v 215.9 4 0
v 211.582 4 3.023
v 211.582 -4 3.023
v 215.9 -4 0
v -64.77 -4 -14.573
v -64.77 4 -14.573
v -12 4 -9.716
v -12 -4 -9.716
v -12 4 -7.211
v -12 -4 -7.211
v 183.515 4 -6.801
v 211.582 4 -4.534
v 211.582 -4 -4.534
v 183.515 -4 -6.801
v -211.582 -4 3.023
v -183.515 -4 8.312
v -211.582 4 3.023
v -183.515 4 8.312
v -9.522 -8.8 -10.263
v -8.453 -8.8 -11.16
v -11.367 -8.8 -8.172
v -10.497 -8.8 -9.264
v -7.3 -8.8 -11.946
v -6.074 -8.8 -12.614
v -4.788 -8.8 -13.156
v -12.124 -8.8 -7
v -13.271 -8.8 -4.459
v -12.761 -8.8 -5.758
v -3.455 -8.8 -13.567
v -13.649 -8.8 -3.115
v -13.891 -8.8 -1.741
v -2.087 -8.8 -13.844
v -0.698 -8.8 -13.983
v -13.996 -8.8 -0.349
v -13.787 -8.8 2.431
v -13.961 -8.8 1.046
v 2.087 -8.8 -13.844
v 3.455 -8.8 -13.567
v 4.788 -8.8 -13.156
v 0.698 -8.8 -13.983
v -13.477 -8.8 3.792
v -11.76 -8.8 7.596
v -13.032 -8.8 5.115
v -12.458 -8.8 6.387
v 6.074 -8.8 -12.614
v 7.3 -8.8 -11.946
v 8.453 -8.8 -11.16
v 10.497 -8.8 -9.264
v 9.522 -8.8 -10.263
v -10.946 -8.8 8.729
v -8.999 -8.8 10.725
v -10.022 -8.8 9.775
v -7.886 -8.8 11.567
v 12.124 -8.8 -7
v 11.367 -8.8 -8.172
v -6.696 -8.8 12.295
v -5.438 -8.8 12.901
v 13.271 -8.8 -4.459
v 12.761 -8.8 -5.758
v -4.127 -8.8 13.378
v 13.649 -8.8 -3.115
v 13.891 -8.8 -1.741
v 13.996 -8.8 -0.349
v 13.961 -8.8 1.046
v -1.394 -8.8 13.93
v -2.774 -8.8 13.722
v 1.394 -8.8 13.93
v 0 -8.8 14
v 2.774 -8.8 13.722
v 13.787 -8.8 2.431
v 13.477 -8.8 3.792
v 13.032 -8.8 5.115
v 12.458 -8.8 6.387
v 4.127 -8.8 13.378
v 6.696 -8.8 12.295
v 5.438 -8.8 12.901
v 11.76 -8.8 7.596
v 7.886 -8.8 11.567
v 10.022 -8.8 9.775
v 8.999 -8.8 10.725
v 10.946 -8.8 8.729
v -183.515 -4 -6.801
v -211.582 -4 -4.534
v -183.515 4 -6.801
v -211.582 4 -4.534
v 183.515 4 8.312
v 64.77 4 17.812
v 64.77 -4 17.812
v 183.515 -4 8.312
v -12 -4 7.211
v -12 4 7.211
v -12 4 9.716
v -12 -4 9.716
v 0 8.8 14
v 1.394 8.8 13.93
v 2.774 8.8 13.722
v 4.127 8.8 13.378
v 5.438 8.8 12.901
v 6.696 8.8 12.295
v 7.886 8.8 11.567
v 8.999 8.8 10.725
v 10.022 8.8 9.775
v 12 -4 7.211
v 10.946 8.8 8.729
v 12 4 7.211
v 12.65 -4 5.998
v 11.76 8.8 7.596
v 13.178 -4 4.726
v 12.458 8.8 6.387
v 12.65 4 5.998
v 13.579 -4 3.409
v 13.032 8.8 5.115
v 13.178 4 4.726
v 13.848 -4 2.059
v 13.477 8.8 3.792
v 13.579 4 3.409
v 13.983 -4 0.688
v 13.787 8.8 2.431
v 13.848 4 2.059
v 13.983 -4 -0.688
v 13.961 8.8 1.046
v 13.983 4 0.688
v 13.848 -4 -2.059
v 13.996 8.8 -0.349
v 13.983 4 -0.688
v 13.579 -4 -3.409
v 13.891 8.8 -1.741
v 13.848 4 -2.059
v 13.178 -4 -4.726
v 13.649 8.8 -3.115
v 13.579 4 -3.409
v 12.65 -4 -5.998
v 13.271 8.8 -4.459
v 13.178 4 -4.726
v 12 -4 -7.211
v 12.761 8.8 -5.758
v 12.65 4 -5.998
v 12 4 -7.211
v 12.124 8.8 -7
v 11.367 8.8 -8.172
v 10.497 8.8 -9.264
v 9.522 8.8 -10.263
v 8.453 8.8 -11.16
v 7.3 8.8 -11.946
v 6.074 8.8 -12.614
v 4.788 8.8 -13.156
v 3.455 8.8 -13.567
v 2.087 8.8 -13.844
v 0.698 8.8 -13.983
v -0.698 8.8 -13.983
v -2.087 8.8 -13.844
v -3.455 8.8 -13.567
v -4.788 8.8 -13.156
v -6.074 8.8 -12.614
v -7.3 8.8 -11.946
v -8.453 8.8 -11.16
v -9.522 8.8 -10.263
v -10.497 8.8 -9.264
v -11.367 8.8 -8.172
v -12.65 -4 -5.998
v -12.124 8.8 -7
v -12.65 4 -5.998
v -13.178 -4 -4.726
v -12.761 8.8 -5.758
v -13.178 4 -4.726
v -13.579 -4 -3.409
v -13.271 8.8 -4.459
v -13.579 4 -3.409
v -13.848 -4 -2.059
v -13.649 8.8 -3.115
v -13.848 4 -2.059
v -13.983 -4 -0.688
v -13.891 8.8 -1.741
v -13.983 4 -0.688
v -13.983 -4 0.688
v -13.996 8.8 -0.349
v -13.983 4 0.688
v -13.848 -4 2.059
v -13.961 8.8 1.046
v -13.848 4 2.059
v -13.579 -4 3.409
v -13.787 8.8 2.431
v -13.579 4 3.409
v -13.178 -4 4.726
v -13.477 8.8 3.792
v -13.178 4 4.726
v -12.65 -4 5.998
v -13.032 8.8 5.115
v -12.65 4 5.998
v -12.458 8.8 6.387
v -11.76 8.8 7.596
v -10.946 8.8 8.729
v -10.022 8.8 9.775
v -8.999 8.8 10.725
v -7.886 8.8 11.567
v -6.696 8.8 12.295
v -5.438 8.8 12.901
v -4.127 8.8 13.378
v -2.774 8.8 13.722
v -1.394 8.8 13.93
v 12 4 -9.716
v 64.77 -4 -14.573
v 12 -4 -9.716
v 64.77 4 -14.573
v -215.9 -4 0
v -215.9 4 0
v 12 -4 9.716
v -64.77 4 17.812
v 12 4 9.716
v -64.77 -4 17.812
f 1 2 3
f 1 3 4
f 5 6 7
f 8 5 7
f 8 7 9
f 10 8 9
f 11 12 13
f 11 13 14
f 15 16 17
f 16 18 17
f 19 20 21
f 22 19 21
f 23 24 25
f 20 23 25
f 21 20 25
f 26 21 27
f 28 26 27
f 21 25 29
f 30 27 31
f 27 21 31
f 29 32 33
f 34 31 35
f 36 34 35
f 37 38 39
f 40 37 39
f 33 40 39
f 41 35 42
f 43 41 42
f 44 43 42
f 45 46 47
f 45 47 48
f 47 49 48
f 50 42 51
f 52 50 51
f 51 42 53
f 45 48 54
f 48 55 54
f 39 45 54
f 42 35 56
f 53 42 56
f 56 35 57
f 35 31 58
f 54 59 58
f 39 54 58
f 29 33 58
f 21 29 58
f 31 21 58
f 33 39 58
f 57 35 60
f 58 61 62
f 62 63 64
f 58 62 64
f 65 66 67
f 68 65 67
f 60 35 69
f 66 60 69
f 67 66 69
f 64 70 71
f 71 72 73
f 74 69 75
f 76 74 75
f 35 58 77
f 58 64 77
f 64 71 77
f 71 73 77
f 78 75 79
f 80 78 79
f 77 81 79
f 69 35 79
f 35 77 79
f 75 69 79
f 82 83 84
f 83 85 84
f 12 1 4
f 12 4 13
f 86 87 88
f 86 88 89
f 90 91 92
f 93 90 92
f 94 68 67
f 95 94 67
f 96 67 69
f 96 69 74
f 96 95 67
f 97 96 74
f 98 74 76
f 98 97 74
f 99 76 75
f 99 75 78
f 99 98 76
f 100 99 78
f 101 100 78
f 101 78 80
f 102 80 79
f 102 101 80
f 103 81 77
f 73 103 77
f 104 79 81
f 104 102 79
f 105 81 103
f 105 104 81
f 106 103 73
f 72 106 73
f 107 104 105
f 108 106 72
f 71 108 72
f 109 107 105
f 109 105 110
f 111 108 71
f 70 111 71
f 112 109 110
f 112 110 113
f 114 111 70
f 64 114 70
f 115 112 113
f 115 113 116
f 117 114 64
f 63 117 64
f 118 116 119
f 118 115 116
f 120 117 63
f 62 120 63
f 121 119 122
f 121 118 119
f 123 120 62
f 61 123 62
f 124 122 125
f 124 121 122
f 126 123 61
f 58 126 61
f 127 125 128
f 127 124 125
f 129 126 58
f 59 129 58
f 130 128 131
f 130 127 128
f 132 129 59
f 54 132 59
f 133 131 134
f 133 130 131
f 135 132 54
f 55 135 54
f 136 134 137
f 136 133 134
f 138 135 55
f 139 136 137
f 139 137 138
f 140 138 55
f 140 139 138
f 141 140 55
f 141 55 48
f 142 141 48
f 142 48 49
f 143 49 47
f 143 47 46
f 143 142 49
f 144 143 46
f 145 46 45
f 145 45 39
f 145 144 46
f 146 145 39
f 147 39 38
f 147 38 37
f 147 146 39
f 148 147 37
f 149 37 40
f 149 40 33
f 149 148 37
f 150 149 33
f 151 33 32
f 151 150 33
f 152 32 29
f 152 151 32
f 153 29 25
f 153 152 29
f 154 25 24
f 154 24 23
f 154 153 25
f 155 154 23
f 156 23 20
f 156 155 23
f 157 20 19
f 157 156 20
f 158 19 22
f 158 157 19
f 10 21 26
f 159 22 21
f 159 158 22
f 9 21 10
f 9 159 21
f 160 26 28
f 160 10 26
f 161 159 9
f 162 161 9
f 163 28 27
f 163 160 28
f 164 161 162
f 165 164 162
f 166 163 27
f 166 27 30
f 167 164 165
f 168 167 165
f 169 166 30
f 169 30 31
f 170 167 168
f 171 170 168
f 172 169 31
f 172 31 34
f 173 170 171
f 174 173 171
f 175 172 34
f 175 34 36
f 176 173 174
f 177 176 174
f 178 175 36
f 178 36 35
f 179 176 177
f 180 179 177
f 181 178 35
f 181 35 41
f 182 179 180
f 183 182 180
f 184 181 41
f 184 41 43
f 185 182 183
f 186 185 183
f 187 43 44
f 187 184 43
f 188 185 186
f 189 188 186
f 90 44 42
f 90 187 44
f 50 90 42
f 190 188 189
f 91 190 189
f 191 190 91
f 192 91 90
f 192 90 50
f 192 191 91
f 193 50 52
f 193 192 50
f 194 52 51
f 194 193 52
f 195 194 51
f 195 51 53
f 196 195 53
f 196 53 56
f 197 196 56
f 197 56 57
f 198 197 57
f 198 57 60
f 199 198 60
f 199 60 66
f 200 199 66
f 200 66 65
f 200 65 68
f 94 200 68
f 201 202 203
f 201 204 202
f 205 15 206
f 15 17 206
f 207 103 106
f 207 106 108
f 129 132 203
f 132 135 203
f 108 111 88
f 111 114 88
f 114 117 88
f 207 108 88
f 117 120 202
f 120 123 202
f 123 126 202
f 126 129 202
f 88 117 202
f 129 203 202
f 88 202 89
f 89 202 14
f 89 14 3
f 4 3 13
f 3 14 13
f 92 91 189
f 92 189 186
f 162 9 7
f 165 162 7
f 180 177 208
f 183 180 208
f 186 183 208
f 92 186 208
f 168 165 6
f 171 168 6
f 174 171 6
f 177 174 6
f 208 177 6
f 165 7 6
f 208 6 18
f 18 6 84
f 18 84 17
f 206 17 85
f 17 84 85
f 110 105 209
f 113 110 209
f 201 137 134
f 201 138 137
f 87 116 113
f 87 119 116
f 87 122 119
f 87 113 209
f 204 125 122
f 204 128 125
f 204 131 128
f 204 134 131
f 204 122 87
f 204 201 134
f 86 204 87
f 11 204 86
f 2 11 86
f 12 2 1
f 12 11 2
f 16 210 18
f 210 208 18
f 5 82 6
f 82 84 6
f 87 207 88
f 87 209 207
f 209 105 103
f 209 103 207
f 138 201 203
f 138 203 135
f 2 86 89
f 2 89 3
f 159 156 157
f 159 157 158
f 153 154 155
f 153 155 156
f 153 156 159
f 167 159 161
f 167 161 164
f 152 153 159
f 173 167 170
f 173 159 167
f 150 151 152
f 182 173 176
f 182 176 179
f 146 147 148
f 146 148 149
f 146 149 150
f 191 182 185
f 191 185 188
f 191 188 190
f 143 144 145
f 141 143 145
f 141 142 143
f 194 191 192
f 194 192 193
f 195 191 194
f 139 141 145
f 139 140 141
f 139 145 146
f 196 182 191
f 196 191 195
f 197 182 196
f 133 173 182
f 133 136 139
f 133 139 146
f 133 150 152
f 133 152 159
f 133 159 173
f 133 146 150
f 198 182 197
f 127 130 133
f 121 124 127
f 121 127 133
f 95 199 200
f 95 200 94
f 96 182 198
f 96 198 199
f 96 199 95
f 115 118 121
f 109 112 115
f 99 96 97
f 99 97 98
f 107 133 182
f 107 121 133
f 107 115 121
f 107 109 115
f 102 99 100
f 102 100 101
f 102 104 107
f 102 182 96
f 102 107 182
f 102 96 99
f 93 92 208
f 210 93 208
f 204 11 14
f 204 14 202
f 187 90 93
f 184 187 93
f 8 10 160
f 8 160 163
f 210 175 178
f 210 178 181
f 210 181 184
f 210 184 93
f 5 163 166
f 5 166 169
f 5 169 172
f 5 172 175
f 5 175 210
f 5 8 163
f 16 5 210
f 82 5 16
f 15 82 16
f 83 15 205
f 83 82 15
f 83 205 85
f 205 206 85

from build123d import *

# Parameters (mm, degrees)
BOSS_EXTRUDE1_DEPTH   = 4
BOSS_EXTRUDE1_2_DEPTH = 4
SKETCH2_R             = 14
BOSS_EXTRUDE2_DEPTH   = 8.8


with BuildPart() as part:
    # Sketch1 → Boss-Extrude1 (new, symmetric)
    with BuildSketch(Plane(origin=(0, 0, 0), x_dir=(1, 0, 0), z_dir=(0, 1, 0))):
        Polygon((12, -9.7155), (64.77, -17.81175), (183.515, -8.31215), (211.582, -3.0226), (215.9, 0), (211.582, 4.5339), (183.515, 6.80085), (64.77, 14.57325), (12, 9.7155), align=None)
    extrude(amount=BOSS_EXTRUDE1_DEPTH, both=True)



with BuildPart() as body_2:
    # Sketch1 → Boss-Extrude1 2 (new, symmetric)
    with BuildSketch(Plane(origin=(0, 0, 0), x_dir=(1, 0, 0), z_dir=(0, 1, 0))):
        Polygon((-12, -9.7155), (-64.77, -17.81175), (-183.515, -8.31215), (-211.582, -3.0226), (-215.9, 0), (-211.582, 4.5339), (-183.515, 6.80085), (-64.77, 14.57325), (-12, 9.7155), align=None)
    extrude(amount=BOSS_EXTRUDE1_2_DEPTH, both=True)


with BuildPart() as part_1:
    add(part.part)

    add(body_2.part)  # Boss-Extrude2 merges body 2
    # Sketch2 → Boss-Extrude2 (add, symmetric)
    with BuildSketch(Plane(origin=(0, 0, 0), x_dir=(1, 0, 0), z_dir=(0, 1, 0))):
        with Locations(Location((0, 0, 0), (0, 0, 270))):
            Circle(SKETCH2_R)
    extrude(amount=BOSS_EXTRUDE2_DEPTH, both=True)


solid = part_1.part
